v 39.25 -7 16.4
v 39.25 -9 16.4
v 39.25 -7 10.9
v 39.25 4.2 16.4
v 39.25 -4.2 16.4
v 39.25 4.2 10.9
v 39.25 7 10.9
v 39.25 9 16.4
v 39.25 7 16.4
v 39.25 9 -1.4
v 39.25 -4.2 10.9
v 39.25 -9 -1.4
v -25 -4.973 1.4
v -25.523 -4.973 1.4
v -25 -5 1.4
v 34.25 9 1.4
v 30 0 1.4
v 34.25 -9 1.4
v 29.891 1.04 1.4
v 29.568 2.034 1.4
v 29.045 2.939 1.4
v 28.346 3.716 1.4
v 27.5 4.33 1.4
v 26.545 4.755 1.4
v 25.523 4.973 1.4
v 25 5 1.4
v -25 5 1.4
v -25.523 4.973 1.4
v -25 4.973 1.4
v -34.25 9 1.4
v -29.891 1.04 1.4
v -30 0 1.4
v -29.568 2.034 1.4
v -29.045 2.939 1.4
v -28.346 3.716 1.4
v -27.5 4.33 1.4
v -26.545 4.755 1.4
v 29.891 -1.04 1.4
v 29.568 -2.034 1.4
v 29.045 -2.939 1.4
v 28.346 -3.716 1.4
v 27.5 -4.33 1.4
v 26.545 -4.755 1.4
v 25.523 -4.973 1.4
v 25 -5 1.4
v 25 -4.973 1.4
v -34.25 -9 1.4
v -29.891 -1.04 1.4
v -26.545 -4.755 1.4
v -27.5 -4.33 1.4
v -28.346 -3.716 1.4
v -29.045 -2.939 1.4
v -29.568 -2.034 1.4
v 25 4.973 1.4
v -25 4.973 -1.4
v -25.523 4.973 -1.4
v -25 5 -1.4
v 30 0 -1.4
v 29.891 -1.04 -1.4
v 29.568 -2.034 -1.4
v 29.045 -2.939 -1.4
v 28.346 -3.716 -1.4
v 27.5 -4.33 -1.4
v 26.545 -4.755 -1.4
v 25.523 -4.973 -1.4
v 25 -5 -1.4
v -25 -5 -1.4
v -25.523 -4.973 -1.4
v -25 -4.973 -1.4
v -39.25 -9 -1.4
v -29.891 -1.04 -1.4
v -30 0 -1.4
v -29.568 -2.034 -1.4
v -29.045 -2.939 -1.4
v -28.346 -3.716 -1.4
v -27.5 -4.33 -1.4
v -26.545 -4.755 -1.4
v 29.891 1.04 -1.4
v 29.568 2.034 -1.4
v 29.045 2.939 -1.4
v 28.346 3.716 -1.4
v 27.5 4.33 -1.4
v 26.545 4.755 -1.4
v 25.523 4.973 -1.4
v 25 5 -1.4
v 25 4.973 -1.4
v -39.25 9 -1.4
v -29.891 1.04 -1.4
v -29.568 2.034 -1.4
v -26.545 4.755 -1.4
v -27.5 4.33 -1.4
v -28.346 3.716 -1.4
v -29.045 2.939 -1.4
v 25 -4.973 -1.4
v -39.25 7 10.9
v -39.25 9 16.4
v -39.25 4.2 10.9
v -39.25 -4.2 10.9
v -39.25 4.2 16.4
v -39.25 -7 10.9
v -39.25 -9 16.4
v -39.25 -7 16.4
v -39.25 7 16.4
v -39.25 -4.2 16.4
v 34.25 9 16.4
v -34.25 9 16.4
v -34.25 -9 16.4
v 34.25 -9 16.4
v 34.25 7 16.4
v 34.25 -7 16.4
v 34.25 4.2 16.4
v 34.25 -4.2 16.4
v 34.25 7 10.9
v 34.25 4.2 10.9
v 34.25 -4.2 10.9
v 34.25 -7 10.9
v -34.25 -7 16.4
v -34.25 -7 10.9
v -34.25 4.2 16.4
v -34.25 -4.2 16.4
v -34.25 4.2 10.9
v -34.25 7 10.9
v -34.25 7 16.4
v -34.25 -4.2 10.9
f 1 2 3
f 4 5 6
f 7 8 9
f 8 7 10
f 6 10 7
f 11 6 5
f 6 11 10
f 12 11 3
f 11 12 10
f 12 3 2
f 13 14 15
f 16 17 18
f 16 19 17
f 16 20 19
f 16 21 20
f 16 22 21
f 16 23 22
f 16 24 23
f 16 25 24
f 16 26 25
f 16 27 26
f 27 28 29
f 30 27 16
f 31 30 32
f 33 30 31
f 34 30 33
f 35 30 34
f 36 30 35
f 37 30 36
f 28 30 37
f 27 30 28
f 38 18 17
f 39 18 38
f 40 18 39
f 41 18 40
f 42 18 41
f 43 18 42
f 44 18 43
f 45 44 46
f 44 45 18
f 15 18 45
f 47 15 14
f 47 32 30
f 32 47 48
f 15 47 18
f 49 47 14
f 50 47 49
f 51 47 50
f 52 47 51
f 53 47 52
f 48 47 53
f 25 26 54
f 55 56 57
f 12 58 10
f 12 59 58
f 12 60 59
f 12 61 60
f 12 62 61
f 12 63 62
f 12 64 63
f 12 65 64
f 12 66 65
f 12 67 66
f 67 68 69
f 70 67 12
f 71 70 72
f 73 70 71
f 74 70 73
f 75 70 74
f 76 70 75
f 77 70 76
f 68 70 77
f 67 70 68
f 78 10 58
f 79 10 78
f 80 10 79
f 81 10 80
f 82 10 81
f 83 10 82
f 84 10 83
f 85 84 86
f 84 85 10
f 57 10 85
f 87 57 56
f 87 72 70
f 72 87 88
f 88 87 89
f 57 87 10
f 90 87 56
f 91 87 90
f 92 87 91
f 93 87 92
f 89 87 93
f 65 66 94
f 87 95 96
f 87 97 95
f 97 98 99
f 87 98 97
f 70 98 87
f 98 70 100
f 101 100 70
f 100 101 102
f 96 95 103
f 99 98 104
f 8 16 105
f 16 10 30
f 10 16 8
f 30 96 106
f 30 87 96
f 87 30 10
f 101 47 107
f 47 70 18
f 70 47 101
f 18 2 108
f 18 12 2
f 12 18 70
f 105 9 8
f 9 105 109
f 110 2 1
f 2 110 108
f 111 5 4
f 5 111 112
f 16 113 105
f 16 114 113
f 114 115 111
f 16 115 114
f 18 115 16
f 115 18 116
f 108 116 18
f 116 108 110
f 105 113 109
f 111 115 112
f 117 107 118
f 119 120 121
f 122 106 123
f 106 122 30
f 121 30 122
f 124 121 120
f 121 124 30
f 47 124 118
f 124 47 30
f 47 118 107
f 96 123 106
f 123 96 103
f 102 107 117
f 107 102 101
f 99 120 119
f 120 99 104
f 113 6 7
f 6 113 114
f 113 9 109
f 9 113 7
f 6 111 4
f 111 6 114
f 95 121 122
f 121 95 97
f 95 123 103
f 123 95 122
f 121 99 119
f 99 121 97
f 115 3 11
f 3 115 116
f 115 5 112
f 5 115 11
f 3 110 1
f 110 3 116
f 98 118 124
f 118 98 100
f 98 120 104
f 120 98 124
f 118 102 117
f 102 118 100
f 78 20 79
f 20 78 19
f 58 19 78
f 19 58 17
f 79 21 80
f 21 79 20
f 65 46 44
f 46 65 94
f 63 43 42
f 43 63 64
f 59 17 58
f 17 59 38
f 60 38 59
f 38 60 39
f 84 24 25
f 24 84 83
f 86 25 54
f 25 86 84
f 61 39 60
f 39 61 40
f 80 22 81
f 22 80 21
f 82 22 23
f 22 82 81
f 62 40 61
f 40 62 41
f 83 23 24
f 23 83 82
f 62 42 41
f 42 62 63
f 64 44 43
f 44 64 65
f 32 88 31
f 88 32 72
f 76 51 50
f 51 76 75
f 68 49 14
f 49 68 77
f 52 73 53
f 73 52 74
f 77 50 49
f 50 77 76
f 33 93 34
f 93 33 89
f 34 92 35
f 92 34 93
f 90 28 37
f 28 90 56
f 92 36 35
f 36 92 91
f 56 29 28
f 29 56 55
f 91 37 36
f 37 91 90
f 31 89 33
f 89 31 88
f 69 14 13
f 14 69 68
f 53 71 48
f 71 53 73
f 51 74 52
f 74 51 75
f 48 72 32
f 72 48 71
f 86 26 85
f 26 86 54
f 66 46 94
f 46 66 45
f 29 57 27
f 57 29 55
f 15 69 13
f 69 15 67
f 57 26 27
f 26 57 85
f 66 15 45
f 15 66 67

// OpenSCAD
difference()
{
  union()
  {
    cube(size=[6*(6+4.5)+4.5+1+10,18,2.8],center=true);

    translate(v=[(6*(6+4.5)+4.5+1)/2+2.5,0,7.5+1.4])
      cube(size=[5,18,15],center=true);

    translate(v=[-(6*(6+4.5)+4.5+1)/2-2.5,0,7.5+1.4])
      cube(size=[5,18,15],center=true);
  }

  translate(v=[(6*(6+4.5)+4.5+1)/2+2.5,9-2-1.4,1.4+15-2.5])
    cube(size=[5,2.8,6],center=true);
  translate(v=[-(6*(6+4.5)+4.5+1)/2-2.5,9-2-1.4,1.4+15-2.5])
    cube(size=[5,2.8,6],center=true);

  translate(v=[(6*(6+4.5)+4.5+1)/2+2.5,-(9-2-1.4),1.4+15-2.5])
    cube(size=[5,2.8,6],center=true);
  translate(v=[-(6*(6+4.5)+4.5+1)/2-2.5,-(9-2-1.4),1.4+15-2.5])
    cube(size=[5,2.8,6],center=true);

  translate(v=[25,0,0]) cylinder(h=2.8,r=5,center=true,$fs=0.1);
  translate(v=[-25,0,0]) cylinder(h=2.8,r=5,center=true,$fs=0.1);

  cube(size=[50,10,2.8],center=true);
}
